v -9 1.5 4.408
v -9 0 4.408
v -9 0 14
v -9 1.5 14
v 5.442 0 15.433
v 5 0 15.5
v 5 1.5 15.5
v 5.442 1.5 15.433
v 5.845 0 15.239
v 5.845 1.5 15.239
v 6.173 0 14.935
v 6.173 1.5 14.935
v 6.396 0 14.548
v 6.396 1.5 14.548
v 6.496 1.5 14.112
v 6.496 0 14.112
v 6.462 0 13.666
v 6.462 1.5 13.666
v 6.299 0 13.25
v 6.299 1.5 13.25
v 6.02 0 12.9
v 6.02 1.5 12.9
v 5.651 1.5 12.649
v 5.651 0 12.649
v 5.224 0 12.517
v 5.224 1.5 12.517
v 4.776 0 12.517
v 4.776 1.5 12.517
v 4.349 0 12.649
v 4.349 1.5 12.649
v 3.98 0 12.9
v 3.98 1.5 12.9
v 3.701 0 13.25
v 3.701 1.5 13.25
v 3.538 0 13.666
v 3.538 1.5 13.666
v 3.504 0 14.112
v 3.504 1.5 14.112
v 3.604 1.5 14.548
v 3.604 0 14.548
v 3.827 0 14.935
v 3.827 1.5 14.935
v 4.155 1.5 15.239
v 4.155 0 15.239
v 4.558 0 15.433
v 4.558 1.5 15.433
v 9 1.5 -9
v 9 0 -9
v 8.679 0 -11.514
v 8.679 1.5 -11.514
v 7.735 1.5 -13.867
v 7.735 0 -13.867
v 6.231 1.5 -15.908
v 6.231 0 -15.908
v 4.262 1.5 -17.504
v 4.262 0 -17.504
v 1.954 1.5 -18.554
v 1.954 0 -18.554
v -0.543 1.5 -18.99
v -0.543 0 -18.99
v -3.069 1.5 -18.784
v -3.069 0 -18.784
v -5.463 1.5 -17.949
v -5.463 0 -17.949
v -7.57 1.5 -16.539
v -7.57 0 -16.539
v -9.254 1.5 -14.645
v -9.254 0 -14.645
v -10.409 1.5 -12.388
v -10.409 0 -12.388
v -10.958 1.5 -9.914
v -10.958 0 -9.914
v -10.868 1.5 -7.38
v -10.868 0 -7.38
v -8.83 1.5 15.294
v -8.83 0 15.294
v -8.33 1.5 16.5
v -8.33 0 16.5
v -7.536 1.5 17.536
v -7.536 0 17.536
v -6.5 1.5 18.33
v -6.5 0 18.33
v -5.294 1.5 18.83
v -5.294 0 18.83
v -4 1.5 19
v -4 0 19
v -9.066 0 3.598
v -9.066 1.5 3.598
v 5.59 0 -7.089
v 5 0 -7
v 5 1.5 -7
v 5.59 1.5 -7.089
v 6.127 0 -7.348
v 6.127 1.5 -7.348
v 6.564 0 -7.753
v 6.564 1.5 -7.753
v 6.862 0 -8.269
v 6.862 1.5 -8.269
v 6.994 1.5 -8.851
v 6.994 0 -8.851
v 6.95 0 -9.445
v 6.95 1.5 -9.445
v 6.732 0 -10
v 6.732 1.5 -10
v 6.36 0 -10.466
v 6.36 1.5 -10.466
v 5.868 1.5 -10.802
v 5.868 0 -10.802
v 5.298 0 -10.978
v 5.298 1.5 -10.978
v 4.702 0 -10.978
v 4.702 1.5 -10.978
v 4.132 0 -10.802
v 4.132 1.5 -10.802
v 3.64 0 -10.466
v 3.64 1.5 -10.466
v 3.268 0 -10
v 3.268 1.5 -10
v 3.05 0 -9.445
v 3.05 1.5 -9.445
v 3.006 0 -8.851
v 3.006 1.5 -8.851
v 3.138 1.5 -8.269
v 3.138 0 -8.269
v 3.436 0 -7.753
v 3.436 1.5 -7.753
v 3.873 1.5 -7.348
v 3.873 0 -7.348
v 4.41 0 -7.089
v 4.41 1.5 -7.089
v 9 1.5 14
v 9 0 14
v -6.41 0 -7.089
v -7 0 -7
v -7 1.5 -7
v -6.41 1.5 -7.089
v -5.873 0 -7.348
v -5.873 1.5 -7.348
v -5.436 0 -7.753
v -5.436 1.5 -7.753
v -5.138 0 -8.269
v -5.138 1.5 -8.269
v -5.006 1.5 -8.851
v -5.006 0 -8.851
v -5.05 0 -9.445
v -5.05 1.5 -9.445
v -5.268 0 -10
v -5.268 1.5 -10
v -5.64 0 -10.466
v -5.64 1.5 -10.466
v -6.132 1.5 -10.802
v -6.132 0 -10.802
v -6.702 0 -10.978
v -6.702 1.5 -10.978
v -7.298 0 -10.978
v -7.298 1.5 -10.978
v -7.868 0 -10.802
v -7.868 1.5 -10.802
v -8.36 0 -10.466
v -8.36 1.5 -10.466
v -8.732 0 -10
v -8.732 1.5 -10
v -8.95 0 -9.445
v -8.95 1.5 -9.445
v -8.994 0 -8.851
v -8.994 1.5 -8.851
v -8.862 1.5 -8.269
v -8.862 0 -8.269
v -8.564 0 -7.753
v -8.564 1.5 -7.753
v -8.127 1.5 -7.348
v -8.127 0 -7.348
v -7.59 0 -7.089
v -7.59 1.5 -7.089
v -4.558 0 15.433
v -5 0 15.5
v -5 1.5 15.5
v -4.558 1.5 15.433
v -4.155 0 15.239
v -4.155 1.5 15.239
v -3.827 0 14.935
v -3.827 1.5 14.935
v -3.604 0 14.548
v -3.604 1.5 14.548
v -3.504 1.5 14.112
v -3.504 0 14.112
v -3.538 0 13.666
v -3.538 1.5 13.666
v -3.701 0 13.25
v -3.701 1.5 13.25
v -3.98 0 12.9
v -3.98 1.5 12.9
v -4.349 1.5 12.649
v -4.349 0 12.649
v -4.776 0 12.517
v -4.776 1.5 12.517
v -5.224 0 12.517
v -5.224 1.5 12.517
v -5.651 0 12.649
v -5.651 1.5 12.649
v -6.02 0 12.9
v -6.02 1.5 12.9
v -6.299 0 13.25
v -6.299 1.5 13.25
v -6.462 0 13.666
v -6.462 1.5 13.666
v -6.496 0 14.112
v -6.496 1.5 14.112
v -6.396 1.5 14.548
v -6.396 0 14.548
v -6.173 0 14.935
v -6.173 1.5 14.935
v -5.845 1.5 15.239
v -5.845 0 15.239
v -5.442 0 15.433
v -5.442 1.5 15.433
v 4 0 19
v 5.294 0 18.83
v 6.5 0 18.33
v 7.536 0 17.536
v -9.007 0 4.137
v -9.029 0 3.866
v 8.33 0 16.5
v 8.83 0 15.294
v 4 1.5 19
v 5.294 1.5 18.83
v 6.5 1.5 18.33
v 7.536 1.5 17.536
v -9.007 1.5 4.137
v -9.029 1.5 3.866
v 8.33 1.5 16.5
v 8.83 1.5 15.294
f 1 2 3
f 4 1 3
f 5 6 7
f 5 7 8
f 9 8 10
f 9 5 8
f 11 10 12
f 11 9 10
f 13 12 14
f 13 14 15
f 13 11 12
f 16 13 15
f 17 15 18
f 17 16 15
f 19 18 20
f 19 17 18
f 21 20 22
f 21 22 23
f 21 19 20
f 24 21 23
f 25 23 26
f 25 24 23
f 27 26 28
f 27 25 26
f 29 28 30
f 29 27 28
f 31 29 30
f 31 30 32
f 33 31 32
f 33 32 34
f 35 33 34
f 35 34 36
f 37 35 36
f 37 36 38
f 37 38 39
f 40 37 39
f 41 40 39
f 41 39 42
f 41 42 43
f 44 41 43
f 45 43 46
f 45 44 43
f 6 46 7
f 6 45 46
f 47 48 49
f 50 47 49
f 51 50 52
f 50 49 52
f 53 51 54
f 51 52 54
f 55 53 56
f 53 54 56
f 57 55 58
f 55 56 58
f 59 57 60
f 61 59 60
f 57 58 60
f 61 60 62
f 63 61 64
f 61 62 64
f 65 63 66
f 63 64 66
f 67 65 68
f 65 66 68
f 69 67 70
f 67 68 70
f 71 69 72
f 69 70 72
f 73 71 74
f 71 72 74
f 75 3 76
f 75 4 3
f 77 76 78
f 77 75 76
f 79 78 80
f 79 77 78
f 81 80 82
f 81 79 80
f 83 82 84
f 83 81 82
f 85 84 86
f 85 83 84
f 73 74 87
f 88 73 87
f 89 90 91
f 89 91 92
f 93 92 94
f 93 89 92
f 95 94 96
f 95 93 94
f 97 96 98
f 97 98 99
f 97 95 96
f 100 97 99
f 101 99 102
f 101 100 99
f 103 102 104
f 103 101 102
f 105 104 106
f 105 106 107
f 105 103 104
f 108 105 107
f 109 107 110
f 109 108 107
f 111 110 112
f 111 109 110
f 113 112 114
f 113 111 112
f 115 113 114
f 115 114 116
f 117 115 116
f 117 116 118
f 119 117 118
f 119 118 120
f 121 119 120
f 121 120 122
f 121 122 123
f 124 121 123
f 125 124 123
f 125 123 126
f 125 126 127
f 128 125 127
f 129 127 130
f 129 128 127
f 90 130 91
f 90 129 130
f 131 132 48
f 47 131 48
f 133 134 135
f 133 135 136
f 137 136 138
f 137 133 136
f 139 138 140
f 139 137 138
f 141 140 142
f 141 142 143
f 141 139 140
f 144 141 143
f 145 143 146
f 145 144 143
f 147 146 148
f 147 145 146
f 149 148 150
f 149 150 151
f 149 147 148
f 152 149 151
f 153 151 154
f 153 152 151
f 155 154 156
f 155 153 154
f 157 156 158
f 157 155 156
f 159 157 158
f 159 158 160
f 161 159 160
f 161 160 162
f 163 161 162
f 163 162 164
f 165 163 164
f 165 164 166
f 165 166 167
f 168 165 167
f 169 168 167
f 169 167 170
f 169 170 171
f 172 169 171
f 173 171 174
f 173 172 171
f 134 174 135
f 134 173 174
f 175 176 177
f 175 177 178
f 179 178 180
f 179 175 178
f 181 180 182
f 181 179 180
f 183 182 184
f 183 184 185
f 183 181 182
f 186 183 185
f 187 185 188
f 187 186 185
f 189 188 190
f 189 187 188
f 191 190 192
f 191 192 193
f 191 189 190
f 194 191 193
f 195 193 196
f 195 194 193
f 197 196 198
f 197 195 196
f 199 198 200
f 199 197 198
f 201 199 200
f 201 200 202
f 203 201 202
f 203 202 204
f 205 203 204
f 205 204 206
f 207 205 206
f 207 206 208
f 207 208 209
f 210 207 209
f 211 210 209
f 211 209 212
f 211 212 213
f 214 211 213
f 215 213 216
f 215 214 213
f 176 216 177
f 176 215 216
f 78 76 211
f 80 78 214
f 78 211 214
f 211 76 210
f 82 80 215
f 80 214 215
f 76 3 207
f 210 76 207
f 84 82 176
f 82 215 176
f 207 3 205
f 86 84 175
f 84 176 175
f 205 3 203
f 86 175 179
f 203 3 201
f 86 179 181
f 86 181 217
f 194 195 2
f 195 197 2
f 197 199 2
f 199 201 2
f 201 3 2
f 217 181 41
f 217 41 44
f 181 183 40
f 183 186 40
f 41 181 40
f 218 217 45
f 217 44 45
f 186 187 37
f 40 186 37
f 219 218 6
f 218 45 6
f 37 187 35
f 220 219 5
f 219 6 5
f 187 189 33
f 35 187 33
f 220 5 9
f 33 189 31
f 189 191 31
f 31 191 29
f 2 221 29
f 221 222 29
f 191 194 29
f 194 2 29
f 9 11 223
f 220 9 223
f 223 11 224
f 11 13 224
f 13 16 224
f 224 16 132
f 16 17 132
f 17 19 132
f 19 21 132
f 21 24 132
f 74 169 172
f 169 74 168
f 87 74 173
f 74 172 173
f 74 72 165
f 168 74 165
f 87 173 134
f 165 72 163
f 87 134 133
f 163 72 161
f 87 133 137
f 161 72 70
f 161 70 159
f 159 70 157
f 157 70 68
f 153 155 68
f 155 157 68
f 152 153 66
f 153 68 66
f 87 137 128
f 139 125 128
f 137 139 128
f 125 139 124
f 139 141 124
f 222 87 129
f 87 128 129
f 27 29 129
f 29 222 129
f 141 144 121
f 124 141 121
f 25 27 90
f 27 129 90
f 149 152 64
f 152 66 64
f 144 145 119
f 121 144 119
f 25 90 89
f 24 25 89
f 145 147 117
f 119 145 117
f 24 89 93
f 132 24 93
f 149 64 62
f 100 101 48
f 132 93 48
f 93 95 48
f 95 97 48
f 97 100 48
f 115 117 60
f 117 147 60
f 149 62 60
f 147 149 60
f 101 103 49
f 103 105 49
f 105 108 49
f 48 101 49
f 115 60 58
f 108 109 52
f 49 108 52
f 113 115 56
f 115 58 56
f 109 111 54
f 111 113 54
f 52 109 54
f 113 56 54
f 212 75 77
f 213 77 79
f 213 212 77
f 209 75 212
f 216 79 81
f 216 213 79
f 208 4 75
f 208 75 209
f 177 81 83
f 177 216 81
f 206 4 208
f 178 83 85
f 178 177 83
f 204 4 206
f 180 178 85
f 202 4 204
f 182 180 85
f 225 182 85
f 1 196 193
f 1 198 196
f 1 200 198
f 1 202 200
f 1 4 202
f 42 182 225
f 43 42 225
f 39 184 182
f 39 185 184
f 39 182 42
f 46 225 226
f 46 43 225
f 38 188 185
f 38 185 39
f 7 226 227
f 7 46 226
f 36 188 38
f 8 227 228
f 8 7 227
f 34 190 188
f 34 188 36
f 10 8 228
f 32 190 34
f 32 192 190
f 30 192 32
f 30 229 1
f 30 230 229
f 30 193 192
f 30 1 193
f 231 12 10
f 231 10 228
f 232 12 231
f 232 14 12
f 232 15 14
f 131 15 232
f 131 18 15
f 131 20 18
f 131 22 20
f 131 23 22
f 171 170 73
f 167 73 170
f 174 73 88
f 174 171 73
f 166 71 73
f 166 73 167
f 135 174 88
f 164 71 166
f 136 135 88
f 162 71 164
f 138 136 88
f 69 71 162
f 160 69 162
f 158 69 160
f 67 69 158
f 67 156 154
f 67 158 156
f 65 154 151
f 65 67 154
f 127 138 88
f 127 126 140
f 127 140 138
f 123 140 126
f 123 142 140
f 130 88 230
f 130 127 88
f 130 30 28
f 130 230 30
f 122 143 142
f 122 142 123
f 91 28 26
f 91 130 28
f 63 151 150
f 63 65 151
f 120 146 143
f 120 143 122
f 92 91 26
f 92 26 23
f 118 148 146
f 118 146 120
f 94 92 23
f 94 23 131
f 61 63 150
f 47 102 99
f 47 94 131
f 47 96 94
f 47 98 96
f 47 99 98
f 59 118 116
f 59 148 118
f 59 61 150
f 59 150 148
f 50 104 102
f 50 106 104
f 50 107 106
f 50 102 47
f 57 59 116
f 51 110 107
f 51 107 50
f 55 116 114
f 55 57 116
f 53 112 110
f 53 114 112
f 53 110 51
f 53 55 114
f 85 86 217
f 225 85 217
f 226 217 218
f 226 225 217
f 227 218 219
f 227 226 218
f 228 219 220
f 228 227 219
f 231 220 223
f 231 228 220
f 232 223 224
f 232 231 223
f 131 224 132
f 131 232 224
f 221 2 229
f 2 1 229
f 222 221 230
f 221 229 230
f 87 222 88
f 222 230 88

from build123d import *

# Parameters (mm, degrees)
SKETCH_1_R      = 1.5
SKETCH_1_R_2    = 2
EXTRUDE_1_DEPTH = 1.5
FILLET_1_R      = 5


with BuildPart() as part:
    # ｽｹｯﾁ1 → ﾎﾞｽ - 押し出し1 (new body)
    with BuildSketch(Plane(origin=(0, 0, 0), x_dir=(1, 0, 0), z_dir=(0, 1, 0))):
        with BuildLine():
            Line((-9, -4), (-9, -19))
            Line((-9, -19), (9, -19))
            Line((9, -19), (9, 9))
            ThreePointArc((9, 9), (-1.812547294, 18.966933676), (-10.867953379, 7.380279002))
            Line((-10.867953379, 7.380279002), (-9, -4))
        make_face()
        with Locations(Location((-5, -14, 0), (0, 0, 270))):
            Circle(SKETCH_1_R, mode=Mode.SUBTRACT)
        with Locations(Location((5, -14, 0), (0, 0, 270))):
            Circle(SKETCH_1_R, mode=Mode.SUBTRACT)
        with Locations(Location((-7, 9, 0), (0, 0, 270))):
            Circle(SKETCH_1_R_2, mode=Mode.SUBTRACT)
        with Locations(Location((5, 9, 0), (0, 0, 270))):
            Circle(SKETCH_1_R_2, mode=Mode.SUBTRACT)
    extrude(amount=EXTRUDE_1_DEPTH)

    # ﾌｨﾚｯﾄ1
    fillet_1_edges = [part.edges().sort_by_distance(p)[0] for p in [
        (9, 0.75, 19),
        (-9, 0.75, 19),
        (-9, 0.75, 4),
    ]]
    fillet(fillet_1_edges, radius=FILLET_1_R)


solid = part.part
